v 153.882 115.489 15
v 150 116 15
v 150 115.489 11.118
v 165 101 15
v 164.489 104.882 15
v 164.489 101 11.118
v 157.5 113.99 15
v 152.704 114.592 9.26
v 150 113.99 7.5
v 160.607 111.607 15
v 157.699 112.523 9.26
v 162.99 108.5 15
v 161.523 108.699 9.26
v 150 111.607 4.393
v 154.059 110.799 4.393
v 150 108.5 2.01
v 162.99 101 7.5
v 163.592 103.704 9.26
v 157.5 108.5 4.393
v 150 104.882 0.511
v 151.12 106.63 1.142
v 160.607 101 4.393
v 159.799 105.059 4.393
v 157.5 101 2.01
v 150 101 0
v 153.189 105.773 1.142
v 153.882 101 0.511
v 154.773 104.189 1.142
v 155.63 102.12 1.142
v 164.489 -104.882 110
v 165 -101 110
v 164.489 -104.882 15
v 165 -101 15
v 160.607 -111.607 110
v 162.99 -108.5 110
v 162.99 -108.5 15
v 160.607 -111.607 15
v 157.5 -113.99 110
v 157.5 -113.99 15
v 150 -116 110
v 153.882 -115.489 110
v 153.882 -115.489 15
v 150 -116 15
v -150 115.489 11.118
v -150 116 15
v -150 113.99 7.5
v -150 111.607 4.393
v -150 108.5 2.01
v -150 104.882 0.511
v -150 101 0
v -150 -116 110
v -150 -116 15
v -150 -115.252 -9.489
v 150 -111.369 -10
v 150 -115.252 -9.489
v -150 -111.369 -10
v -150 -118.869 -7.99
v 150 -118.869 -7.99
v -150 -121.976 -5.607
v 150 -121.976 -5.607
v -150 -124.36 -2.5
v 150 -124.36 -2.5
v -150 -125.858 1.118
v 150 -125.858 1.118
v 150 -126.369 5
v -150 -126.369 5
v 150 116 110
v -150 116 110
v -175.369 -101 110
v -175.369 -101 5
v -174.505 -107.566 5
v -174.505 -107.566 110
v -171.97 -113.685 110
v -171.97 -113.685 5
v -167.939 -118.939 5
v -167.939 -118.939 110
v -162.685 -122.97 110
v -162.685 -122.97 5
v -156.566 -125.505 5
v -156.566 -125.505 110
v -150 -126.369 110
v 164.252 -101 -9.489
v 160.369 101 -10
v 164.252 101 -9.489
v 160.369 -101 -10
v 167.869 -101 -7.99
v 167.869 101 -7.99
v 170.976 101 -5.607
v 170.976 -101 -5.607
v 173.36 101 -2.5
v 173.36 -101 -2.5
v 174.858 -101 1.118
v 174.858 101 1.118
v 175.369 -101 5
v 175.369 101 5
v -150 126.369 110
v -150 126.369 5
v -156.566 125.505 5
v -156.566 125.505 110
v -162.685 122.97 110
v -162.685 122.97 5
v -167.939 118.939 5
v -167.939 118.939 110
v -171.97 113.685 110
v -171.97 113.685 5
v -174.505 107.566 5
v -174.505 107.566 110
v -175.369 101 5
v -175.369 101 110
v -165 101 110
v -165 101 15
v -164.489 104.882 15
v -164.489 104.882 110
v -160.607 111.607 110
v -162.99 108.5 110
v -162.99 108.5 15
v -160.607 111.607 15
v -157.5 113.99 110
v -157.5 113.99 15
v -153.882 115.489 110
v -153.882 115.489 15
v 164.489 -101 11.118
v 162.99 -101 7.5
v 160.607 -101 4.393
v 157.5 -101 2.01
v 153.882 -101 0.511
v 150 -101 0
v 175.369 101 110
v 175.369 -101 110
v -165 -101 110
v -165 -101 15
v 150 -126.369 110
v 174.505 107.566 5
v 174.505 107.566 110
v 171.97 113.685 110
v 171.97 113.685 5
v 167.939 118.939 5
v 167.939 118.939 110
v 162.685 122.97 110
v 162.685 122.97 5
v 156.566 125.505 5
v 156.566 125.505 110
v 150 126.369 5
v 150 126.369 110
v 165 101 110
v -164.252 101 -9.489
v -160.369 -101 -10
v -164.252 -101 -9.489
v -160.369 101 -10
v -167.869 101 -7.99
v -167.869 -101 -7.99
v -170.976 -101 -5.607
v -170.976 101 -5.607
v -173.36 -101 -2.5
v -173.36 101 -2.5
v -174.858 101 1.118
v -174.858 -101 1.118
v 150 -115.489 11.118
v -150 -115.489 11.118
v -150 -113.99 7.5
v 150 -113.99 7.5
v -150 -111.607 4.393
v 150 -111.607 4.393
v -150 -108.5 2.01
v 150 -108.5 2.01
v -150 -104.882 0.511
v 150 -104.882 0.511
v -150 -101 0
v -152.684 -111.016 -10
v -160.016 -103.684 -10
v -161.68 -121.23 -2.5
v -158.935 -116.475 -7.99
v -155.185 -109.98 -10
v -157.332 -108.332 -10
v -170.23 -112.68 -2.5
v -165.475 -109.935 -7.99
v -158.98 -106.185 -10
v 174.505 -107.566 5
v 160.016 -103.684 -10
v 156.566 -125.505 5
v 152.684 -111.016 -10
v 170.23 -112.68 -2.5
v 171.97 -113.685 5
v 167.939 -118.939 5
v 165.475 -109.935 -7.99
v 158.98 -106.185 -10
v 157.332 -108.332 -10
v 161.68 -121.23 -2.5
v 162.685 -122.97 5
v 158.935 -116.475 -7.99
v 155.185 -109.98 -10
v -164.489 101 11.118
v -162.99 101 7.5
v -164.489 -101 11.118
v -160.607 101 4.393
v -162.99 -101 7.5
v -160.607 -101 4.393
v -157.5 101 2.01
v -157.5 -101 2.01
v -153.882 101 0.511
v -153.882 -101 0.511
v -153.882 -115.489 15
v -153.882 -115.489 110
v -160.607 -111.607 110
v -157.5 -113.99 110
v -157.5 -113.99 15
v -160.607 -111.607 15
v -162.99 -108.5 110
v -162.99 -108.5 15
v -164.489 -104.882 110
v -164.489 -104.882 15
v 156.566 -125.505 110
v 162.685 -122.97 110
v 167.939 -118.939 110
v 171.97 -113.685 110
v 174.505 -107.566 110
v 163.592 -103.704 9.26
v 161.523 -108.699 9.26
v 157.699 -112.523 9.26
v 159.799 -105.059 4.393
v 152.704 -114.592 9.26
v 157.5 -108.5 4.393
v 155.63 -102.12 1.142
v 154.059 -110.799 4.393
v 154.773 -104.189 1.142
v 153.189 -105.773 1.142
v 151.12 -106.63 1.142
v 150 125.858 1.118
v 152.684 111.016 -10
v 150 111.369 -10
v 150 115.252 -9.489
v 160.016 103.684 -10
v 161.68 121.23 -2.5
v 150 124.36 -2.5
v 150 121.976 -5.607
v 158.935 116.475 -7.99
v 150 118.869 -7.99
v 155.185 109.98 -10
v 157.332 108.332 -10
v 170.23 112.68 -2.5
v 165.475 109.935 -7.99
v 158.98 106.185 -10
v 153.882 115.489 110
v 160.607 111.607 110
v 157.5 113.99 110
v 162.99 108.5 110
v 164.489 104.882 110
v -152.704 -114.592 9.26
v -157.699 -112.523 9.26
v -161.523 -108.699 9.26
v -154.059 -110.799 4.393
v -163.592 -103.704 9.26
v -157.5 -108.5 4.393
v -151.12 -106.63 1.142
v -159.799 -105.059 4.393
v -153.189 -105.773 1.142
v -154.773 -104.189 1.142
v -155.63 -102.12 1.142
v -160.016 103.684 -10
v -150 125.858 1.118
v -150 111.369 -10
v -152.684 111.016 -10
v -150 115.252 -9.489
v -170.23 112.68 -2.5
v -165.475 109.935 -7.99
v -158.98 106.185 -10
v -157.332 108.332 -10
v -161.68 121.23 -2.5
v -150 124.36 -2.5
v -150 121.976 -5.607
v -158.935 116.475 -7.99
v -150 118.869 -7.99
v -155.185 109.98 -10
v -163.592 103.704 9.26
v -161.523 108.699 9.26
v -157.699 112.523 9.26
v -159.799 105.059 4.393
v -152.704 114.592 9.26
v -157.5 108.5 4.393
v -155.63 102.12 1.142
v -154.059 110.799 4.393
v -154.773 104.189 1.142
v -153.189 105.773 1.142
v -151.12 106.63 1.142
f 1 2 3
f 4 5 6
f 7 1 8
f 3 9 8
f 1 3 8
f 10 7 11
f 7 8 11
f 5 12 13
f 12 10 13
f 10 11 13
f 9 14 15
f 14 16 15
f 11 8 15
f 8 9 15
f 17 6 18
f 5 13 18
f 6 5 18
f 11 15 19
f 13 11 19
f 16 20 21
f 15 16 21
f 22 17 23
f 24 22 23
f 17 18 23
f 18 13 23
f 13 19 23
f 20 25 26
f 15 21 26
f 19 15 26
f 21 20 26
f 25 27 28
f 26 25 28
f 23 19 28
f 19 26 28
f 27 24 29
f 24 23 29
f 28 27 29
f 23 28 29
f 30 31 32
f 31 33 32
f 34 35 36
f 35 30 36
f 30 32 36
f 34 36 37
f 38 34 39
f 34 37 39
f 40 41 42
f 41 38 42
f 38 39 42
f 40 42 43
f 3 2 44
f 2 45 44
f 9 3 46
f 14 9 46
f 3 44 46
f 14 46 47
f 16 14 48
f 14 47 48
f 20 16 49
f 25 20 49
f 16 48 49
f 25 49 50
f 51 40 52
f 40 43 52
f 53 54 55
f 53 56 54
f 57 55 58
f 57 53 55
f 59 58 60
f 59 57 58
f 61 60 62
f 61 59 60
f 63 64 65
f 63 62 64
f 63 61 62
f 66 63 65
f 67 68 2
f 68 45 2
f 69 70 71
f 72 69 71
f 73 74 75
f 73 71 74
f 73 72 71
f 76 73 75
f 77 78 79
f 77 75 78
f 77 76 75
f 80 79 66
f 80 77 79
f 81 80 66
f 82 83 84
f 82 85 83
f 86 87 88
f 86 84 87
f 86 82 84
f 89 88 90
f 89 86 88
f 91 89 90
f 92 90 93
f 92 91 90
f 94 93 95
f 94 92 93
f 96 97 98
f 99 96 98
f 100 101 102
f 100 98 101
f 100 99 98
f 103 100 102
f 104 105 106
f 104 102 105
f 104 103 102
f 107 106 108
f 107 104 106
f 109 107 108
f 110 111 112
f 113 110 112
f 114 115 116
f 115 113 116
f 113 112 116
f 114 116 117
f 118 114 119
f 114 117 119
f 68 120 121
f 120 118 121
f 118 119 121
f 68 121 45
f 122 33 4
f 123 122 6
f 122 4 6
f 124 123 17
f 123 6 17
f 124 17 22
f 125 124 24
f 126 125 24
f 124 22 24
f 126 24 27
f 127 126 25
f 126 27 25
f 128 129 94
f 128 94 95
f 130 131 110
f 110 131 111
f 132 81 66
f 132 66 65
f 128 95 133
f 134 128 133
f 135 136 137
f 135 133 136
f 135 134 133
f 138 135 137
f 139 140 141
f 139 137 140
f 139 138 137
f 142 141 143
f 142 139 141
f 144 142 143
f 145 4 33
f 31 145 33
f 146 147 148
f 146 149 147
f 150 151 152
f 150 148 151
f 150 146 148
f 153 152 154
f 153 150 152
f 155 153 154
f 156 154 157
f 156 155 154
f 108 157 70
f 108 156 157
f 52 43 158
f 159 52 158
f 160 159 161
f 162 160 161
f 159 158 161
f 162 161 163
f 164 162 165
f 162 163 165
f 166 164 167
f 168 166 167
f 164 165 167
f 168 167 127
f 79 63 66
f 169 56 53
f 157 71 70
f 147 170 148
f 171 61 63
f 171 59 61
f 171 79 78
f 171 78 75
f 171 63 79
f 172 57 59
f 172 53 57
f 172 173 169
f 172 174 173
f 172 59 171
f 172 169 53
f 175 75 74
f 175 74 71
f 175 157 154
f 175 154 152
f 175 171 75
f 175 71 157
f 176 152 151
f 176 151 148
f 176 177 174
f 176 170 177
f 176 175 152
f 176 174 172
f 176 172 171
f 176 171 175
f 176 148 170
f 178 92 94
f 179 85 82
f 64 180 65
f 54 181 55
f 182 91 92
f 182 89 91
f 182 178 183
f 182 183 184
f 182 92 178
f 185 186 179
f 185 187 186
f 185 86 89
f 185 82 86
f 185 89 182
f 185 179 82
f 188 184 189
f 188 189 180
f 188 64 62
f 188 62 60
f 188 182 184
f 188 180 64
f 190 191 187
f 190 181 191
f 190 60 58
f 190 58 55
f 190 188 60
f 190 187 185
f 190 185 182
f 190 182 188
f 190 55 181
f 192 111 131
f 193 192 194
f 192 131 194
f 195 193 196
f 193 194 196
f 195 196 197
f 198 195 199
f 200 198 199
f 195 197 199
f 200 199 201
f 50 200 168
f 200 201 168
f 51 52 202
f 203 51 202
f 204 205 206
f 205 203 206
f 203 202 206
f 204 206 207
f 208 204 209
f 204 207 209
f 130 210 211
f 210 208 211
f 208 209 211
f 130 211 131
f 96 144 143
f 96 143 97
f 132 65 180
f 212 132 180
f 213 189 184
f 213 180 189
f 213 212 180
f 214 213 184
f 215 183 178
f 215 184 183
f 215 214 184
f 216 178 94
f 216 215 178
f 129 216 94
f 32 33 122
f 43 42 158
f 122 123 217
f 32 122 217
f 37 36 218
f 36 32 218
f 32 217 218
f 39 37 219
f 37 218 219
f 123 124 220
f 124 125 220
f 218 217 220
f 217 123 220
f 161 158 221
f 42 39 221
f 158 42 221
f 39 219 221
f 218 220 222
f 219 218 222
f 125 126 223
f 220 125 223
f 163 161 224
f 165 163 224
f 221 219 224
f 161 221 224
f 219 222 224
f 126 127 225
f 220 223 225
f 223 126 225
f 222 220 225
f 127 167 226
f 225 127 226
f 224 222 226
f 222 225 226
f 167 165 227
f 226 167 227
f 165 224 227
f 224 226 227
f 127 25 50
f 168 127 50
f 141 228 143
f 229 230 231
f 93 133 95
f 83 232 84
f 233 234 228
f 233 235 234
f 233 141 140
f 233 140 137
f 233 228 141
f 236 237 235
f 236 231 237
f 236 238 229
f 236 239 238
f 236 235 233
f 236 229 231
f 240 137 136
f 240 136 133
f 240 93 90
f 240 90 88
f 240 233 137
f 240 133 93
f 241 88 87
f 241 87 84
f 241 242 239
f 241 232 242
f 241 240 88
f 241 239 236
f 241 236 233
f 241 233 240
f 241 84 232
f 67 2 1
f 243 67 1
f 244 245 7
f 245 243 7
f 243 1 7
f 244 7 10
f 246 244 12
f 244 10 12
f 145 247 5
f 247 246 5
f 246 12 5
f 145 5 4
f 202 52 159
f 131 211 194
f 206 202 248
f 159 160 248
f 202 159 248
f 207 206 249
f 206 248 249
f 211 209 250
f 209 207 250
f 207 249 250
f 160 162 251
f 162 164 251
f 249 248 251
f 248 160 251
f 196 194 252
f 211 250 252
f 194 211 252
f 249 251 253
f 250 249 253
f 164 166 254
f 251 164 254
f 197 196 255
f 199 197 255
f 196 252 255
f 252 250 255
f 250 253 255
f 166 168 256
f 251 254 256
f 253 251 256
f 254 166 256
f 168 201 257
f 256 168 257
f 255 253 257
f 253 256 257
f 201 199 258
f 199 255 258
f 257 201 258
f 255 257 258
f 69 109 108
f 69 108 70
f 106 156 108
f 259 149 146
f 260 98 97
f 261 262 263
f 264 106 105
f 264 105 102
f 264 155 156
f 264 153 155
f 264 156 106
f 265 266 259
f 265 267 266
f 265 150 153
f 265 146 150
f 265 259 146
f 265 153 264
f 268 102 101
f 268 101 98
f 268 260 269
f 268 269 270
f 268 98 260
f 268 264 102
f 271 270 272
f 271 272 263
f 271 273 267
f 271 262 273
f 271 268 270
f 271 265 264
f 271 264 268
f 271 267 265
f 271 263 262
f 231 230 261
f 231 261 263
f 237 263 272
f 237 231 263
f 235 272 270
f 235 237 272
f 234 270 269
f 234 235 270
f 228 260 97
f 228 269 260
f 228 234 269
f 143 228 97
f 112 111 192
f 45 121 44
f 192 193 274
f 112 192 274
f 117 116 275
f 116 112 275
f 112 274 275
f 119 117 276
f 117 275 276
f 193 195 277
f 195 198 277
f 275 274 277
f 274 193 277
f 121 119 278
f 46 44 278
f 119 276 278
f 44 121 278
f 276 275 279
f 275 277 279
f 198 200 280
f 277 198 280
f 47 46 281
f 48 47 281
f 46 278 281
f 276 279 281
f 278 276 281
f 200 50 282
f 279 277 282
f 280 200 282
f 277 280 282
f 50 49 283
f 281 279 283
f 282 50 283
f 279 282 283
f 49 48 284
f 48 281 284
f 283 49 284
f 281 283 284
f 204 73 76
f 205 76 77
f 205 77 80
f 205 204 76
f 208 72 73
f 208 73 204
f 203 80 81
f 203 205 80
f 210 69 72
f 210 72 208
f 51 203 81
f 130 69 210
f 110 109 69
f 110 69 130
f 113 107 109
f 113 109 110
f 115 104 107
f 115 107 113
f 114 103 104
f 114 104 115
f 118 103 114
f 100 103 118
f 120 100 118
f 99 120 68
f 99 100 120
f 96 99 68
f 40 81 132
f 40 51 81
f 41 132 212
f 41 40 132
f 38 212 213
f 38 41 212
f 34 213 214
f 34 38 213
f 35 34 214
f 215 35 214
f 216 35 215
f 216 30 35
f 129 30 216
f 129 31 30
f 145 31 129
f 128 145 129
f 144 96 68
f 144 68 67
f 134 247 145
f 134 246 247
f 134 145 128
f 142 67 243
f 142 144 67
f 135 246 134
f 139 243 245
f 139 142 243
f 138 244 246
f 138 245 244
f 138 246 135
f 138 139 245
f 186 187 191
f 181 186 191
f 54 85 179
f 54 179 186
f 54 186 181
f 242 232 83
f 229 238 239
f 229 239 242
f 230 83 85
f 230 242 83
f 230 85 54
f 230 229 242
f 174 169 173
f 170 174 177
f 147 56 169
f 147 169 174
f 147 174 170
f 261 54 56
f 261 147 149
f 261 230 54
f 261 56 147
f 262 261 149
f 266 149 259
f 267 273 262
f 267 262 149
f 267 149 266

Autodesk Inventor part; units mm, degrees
ref_plane "YZ Plane" through (0, 0, 0) normal (1, 0, 0) x (0, 1, 0)
ref_plane "XZ Plane" through (0, 0, 0) normal (0, 1, 0) x (-1, 0, 0)
ref_plane "XY Plane" through (0, 0, 0) normal (0, 0, 1) x (1, 0, 0)
sketch "Эскиз1" plane through (0, 0, 0) normal (0, 0, 1) x (1, 0, 0)
  line L0 (-150, 116) -> (150, 116)
  line L1 (165, 101) -> (165, -101)
  line L2 (150, -116) -> (-150, -116)
  line L3 (-165, -101) -> (-165, 101)
  line L4 (-252.8728, 0) -> (252.8728, 0) projected
  line L5 (0, -184.2728) -> (0, 184.2728) projected
  arc A0 (-150, 116) -> (-165, 101) centre (-150, 101) ccw
  arc A1 (165, 101) -> (150, 116) centre (150, 101) ccw
  arc A2 (150, -116) -> (165, -101) centre (150, -101) ccw
  arc A3 (-165, -101) -> (-150, -116) centre (-150, -101) ccw
  line L6 (-175.3693, 101) -> (-175.3693, -101)
  arc A4 (-175.3693, -101) -> (-150, -126.3693) centre (-150, -101) ccw
  line L7 (-150, -126.3693) -> (150, -126.3693)
  arc A5 (150, -126.3693) -> (175.3693, -101) centre (150, -101) ccw
  line L8 (175.3693, -101) -> (175.3693, 101)
  arc A6 (175.3693, 101) -> (150, 126.3693) centre (150, 101) ccw
  line L9 (150, 126.3693) -> (-150, 126.3693)
  arc A7 (-150, 126.3693) -> (-175.3693, 101) centre (-150, 101) ccw
  point P0 (0, 0)
  dimension "d0" = 232
  dimension "d1" = 330
  dimension "d2" = 15
extrude "Выдавливание1" add sketch "Эскиз1" along normal blind 110 contours A0 L3 L4 L6 A7 L9 L5 L0 | L5 L9 A6 L8 L4 L1 A1 L0 | L3 A3 L2 L5 L7 A4 L6 L4 | L4 L8 A5 L7 L5 L2 A2 L1
sketch "Эскиз2" plane through (0, 0, 0) normal (0, 0, -1) x (-1, 0, 0)
  line L0 (150, -126.3693) -> (-150, -126.3693) projected
  arc A0 (150, -126.3693) -> (175.3693, -101) centre (150, -101) ccw projected
  line L1 (175.3693, 101) -> (175.3693, -101) projected
  arc A1 (175.3693, 101) -> (150, 126.3693) centre (150, 101) ccw projected
  line L2 (-150, 126.3693) -> (150, 126.3693) projected
  arc A2 (-150, 126.3693) -> (-175.3693, 101) centre (-150, 101) ccw projected
  line L3 (-175.3693, -101) -> (-175.3693, 101) projected
  arc A3 (-175.3693, -101) -> (-150, -126.3693) centre (-150, -101) ccw projected
  point P0 (0, 0)
extrude "Выдавливание2" add sketch "Эскиз2" along normal blind 10
fillet "Сопряжение1" radius 15 8 edges at (-167.9388, -118.9388, -10) (-175.3693, 0, -10) (-167.9388, 118.9388, -10) (0, 126.3693, -10) (167.9388, 118.9388, -10) (175.3693, 0, -10) (167.9388, -118.9388, -10) (0, -126.3693, -10)
fillet "Сопряжение2" radius 15 8 edges at (160.6066, 111.6066, 0) (165, 0, 0) (160.6066, -111.6066, 0) (0, -116, 0) (-160.6066, -111.6066, 0) (-165, 0, 0) (-160.6066, 111.6066, 0) (0, 116, 0)
properties part number "Корпус НАСУ"
